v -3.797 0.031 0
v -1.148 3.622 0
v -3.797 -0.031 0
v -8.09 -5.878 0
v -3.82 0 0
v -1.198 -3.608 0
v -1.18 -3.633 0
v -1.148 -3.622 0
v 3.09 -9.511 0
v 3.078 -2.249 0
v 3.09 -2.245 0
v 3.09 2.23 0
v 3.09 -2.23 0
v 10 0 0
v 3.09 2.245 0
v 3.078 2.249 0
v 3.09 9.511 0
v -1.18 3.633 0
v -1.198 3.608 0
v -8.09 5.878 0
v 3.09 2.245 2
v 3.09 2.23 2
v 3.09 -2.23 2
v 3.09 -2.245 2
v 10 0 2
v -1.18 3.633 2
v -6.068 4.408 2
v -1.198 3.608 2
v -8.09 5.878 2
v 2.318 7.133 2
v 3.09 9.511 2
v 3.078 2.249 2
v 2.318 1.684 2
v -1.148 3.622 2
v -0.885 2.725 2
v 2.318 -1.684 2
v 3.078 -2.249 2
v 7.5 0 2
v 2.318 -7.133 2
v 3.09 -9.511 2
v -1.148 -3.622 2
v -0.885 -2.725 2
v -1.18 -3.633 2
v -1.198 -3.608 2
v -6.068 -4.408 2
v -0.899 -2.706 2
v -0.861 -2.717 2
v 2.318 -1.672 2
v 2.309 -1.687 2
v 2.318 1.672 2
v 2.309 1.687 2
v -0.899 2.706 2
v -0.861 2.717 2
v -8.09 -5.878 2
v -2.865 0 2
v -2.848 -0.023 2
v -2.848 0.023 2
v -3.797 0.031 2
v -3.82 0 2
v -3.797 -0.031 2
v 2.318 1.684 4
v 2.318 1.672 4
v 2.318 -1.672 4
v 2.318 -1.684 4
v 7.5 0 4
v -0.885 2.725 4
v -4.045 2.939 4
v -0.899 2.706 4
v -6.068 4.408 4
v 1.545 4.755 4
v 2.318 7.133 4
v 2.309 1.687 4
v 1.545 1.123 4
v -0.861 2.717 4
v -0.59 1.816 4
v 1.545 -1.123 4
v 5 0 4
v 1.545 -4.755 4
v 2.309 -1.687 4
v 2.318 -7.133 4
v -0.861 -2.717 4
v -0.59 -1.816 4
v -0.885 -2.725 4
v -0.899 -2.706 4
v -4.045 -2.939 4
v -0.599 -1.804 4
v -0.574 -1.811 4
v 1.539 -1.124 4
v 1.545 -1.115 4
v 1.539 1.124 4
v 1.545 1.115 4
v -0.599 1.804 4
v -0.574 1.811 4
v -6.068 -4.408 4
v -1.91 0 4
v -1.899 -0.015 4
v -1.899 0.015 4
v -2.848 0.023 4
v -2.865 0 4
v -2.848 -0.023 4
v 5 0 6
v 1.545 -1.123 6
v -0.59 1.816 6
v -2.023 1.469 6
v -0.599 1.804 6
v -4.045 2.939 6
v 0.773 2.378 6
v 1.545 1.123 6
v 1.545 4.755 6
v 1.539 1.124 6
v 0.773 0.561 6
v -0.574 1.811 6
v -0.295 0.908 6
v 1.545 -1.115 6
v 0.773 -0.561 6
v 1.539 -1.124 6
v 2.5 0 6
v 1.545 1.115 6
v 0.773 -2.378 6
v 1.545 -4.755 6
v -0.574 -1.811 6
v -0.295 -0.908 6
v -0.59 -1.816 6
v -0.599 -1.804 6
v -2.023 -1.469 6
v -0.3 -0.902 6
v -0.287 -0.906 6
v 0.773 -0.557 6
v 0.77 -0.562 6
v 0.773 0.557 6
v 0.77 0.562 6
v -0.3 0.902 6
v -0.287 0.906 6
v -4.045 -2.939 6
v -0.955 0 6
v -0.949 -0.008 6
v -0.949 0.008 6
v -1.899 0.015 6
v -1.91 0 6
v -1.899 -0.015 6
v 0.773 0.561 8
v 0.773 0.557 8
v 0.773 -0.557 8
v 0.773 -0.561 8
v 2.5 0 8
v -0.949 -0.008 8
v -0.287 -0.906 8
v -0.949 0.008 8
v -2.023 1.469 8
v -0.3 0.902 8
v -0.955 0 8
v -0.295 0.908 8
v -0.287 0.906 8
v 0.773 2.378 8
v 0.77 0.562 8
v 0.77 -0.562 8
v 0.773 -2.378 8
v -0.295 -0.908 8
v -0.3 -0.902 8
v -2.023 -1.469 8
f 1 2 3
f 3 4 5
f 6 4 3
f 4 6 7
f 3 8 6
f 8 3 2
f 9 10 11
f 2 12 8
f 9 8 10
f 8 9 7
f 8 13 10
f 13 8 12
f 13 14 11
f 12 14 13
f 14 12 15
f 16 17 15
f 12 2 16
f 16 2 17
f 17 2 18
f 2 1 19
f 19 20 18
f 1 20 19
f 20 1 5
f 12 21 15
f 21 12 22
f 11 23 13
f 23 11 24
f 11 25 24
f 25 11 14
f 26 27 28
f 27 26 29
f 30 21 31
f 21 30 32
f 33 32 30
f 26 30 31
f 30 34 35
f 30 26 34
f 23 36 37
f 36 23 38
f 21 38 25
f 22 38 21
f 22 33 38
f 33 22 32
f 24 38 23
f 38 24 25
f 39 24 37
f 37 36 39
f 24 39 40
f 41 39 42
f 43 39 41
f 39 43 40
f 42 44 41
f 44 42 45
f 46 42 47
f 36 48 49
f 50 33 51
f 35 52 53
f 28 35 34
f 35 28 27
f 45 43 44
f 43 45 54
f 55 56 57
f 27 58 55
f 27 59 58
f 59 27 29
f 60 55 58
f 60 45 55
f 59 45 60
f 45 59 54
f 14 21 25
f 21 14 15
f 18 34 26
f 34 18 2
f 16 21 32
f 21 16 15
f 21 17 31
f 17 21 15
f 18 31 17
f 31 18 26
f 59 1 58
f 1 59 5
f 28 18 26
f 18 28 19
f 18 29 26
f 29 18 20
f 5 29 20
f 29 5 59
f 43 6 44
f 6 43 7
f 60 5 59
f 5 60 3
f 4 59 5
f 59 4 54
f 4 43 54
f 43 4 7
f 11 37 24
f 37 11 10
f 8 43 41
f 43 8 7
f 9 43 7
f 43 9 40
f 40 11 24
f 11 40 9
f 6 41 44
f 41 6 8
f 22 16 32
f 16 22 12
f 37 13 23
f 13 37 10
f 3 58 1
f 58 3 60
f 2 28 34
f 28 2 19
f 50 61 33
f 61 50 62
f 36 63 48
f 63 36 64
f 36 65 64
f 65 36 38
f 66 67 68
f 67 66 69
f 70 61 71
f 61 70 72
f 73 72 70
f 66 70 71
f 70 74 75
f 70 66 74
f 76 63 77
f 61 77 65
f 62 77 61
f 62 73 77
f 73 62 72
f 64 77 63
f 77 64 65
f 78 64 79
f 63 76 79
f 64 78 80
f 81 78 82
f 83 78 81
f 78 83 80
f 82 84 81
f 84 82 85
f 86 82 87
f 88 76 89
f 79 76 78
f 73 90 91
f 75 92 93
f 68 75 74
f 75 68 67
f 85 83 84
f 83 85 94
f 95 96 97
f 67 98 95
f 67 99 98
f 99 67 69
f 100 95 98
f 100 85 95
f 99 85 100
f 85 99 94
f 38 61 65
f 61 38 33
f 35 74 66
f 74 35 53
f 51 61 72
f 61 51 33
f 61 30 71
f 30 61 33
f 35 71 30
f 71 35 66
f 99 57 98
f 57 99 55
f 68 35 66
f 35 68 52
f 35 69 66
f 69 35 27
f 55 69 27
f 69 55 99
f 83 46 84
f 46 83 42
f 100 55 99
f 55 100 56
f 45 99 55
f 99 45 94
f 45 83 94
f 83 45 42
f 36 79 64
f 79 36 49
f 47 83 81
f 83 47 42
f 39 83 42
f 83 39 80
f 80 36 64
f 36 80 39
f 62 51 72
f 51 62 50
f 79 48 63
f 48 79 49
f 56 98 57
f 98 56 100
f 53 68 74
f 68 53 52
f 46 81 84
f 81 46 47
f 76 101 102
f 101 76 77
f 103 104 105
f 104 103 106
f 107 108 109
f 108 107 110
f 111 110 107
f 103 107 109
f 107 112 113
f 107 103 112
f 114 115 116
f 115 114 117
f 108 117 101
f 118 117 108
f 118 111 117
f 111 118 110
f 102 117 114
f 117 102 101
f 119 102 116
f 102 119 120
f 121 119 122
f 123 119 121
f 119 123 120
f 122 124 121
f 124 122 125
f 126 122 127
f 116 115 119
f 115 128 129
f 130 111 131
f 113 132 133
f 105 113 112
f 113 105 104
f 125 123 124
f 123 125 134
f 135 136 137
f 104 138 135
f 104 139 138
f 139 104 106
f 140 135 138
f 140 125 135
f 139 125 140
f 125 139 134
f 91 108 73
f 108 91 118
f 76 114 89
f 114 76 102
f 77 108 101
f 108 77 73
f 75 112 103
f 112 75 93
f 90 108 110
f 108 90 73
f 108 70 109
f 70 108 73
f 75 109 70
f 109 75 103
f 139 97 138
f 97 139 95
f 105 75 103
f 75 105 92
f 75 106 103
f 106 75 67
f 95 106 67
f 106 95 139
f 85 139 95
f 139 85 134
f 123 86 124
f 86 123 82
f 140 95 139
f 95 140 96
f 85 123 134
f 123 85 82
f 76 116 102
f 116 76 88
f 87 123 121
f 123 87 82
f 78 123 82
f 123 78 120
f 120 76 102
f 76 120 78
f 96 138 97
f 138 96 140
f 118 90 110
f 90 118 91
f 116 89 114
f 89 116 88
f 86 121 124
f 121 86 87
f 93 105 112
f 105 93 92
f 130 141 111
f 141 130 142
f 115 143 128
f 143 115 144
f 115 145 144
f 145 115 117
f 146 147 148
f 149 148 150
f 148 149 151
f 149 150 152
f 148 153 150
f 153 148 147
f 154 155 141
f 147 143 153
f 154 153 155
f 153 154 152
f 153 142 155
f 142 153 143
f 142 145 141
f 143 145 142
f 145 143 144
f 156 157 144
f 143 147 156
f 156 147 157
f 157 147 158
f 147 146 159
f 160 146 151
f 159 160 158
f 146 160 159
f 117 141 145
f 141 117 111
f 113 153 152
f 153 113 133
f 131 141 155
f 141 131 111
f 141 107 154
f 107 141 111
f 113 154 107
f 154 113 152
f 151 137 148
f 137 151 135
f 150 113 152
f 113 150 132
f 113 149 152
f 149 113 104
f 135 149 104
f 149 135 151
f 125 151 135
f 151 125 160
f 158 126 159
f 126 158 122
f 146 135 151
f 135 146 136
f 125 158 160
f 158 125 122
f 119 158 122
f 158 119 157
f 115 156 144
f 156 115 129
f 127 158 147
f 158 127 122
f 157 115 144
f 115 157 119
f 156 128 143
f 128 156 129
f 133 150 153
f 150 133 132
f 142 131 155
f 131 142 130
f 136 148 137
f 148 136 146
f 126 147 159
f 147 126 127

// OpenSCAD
// file: Star.scad
//very simple point object
module Star_Point(length=5, base=5, h=6) {
    
    linear_extrude(height=h){
        polygon(points=[
            [0     ,  base/2],
            [0     , -base/2],
            [length,  0     ]
        ]);
    } 
    
} //END Star_point


//Helper for Star Determines and sets pointlength if we are making a 'straight'
//  star
function setPl( pointLength, length, straight, ang) =
    (straight)?(length*(1/tan(90-ang)))/((1/tan(ang/2))+(1/tan(90-ang))) : pointLength;
//END setPl


//Creates a star with a given number of points
//Gap if $fn is not properly set
//@straight: will override pointLength to make sure star appears to
// be constructed of connected straight lines
module Star(points=5, pointLength=5, h=6, inscCirc=24, straight=false) {
    
    //Precalc values that define the shape of the star
    lTheta = 180 / points;
    pL     = setPl(pointLength, inscCirc/2, straight, 2*lTheta);
    A      = (inscCirc / 2) - pL;
    radius = A / cos(lTheta);
    B      = 2*radius*sin(lTheta);

    //create a plug for the center of the star
    cylinder(r=radius, h=h);
    
    //create all points
    for(i = [0:points])
        rotate([0,0, 2*i*lTheta])
            translate([A,0,0])
                Star_Point(length=pL, base=B, h=h);

}

$fn=29; //make sure there are no gaps in the center rendering
Star(points=9, pointLength=11, inscCirc=24, straight=true);
// main file
use <./Star.scad>

module Star_Dome(h=10, points=5, straight=false, pointLength=10, inscCirc=25, layerCount=5) {
    
    layerHeight     = h   / layerCount;
    echo(layerHeight);
    layerReduction  = inscCirc / layerCount; //diameter reduction
    // only meaningful if straight = false
    pointProportion = (straight==true) ? 0 : pointLength / (inscCirc / 2);
    for(i = [0:layerCount]) {
        //point length should change with insc circle
        Star(   points      = points,
                inscCirc    = inscCirc    - (i * layerReduction),
                pointLength = pointLength - (i * (layerReduction/2) * pointProportion), 
                straight    = straight,
                h           = layerHeight * i);
    }
}
//Star(straight = true);
Star_Dome( straight=true );
